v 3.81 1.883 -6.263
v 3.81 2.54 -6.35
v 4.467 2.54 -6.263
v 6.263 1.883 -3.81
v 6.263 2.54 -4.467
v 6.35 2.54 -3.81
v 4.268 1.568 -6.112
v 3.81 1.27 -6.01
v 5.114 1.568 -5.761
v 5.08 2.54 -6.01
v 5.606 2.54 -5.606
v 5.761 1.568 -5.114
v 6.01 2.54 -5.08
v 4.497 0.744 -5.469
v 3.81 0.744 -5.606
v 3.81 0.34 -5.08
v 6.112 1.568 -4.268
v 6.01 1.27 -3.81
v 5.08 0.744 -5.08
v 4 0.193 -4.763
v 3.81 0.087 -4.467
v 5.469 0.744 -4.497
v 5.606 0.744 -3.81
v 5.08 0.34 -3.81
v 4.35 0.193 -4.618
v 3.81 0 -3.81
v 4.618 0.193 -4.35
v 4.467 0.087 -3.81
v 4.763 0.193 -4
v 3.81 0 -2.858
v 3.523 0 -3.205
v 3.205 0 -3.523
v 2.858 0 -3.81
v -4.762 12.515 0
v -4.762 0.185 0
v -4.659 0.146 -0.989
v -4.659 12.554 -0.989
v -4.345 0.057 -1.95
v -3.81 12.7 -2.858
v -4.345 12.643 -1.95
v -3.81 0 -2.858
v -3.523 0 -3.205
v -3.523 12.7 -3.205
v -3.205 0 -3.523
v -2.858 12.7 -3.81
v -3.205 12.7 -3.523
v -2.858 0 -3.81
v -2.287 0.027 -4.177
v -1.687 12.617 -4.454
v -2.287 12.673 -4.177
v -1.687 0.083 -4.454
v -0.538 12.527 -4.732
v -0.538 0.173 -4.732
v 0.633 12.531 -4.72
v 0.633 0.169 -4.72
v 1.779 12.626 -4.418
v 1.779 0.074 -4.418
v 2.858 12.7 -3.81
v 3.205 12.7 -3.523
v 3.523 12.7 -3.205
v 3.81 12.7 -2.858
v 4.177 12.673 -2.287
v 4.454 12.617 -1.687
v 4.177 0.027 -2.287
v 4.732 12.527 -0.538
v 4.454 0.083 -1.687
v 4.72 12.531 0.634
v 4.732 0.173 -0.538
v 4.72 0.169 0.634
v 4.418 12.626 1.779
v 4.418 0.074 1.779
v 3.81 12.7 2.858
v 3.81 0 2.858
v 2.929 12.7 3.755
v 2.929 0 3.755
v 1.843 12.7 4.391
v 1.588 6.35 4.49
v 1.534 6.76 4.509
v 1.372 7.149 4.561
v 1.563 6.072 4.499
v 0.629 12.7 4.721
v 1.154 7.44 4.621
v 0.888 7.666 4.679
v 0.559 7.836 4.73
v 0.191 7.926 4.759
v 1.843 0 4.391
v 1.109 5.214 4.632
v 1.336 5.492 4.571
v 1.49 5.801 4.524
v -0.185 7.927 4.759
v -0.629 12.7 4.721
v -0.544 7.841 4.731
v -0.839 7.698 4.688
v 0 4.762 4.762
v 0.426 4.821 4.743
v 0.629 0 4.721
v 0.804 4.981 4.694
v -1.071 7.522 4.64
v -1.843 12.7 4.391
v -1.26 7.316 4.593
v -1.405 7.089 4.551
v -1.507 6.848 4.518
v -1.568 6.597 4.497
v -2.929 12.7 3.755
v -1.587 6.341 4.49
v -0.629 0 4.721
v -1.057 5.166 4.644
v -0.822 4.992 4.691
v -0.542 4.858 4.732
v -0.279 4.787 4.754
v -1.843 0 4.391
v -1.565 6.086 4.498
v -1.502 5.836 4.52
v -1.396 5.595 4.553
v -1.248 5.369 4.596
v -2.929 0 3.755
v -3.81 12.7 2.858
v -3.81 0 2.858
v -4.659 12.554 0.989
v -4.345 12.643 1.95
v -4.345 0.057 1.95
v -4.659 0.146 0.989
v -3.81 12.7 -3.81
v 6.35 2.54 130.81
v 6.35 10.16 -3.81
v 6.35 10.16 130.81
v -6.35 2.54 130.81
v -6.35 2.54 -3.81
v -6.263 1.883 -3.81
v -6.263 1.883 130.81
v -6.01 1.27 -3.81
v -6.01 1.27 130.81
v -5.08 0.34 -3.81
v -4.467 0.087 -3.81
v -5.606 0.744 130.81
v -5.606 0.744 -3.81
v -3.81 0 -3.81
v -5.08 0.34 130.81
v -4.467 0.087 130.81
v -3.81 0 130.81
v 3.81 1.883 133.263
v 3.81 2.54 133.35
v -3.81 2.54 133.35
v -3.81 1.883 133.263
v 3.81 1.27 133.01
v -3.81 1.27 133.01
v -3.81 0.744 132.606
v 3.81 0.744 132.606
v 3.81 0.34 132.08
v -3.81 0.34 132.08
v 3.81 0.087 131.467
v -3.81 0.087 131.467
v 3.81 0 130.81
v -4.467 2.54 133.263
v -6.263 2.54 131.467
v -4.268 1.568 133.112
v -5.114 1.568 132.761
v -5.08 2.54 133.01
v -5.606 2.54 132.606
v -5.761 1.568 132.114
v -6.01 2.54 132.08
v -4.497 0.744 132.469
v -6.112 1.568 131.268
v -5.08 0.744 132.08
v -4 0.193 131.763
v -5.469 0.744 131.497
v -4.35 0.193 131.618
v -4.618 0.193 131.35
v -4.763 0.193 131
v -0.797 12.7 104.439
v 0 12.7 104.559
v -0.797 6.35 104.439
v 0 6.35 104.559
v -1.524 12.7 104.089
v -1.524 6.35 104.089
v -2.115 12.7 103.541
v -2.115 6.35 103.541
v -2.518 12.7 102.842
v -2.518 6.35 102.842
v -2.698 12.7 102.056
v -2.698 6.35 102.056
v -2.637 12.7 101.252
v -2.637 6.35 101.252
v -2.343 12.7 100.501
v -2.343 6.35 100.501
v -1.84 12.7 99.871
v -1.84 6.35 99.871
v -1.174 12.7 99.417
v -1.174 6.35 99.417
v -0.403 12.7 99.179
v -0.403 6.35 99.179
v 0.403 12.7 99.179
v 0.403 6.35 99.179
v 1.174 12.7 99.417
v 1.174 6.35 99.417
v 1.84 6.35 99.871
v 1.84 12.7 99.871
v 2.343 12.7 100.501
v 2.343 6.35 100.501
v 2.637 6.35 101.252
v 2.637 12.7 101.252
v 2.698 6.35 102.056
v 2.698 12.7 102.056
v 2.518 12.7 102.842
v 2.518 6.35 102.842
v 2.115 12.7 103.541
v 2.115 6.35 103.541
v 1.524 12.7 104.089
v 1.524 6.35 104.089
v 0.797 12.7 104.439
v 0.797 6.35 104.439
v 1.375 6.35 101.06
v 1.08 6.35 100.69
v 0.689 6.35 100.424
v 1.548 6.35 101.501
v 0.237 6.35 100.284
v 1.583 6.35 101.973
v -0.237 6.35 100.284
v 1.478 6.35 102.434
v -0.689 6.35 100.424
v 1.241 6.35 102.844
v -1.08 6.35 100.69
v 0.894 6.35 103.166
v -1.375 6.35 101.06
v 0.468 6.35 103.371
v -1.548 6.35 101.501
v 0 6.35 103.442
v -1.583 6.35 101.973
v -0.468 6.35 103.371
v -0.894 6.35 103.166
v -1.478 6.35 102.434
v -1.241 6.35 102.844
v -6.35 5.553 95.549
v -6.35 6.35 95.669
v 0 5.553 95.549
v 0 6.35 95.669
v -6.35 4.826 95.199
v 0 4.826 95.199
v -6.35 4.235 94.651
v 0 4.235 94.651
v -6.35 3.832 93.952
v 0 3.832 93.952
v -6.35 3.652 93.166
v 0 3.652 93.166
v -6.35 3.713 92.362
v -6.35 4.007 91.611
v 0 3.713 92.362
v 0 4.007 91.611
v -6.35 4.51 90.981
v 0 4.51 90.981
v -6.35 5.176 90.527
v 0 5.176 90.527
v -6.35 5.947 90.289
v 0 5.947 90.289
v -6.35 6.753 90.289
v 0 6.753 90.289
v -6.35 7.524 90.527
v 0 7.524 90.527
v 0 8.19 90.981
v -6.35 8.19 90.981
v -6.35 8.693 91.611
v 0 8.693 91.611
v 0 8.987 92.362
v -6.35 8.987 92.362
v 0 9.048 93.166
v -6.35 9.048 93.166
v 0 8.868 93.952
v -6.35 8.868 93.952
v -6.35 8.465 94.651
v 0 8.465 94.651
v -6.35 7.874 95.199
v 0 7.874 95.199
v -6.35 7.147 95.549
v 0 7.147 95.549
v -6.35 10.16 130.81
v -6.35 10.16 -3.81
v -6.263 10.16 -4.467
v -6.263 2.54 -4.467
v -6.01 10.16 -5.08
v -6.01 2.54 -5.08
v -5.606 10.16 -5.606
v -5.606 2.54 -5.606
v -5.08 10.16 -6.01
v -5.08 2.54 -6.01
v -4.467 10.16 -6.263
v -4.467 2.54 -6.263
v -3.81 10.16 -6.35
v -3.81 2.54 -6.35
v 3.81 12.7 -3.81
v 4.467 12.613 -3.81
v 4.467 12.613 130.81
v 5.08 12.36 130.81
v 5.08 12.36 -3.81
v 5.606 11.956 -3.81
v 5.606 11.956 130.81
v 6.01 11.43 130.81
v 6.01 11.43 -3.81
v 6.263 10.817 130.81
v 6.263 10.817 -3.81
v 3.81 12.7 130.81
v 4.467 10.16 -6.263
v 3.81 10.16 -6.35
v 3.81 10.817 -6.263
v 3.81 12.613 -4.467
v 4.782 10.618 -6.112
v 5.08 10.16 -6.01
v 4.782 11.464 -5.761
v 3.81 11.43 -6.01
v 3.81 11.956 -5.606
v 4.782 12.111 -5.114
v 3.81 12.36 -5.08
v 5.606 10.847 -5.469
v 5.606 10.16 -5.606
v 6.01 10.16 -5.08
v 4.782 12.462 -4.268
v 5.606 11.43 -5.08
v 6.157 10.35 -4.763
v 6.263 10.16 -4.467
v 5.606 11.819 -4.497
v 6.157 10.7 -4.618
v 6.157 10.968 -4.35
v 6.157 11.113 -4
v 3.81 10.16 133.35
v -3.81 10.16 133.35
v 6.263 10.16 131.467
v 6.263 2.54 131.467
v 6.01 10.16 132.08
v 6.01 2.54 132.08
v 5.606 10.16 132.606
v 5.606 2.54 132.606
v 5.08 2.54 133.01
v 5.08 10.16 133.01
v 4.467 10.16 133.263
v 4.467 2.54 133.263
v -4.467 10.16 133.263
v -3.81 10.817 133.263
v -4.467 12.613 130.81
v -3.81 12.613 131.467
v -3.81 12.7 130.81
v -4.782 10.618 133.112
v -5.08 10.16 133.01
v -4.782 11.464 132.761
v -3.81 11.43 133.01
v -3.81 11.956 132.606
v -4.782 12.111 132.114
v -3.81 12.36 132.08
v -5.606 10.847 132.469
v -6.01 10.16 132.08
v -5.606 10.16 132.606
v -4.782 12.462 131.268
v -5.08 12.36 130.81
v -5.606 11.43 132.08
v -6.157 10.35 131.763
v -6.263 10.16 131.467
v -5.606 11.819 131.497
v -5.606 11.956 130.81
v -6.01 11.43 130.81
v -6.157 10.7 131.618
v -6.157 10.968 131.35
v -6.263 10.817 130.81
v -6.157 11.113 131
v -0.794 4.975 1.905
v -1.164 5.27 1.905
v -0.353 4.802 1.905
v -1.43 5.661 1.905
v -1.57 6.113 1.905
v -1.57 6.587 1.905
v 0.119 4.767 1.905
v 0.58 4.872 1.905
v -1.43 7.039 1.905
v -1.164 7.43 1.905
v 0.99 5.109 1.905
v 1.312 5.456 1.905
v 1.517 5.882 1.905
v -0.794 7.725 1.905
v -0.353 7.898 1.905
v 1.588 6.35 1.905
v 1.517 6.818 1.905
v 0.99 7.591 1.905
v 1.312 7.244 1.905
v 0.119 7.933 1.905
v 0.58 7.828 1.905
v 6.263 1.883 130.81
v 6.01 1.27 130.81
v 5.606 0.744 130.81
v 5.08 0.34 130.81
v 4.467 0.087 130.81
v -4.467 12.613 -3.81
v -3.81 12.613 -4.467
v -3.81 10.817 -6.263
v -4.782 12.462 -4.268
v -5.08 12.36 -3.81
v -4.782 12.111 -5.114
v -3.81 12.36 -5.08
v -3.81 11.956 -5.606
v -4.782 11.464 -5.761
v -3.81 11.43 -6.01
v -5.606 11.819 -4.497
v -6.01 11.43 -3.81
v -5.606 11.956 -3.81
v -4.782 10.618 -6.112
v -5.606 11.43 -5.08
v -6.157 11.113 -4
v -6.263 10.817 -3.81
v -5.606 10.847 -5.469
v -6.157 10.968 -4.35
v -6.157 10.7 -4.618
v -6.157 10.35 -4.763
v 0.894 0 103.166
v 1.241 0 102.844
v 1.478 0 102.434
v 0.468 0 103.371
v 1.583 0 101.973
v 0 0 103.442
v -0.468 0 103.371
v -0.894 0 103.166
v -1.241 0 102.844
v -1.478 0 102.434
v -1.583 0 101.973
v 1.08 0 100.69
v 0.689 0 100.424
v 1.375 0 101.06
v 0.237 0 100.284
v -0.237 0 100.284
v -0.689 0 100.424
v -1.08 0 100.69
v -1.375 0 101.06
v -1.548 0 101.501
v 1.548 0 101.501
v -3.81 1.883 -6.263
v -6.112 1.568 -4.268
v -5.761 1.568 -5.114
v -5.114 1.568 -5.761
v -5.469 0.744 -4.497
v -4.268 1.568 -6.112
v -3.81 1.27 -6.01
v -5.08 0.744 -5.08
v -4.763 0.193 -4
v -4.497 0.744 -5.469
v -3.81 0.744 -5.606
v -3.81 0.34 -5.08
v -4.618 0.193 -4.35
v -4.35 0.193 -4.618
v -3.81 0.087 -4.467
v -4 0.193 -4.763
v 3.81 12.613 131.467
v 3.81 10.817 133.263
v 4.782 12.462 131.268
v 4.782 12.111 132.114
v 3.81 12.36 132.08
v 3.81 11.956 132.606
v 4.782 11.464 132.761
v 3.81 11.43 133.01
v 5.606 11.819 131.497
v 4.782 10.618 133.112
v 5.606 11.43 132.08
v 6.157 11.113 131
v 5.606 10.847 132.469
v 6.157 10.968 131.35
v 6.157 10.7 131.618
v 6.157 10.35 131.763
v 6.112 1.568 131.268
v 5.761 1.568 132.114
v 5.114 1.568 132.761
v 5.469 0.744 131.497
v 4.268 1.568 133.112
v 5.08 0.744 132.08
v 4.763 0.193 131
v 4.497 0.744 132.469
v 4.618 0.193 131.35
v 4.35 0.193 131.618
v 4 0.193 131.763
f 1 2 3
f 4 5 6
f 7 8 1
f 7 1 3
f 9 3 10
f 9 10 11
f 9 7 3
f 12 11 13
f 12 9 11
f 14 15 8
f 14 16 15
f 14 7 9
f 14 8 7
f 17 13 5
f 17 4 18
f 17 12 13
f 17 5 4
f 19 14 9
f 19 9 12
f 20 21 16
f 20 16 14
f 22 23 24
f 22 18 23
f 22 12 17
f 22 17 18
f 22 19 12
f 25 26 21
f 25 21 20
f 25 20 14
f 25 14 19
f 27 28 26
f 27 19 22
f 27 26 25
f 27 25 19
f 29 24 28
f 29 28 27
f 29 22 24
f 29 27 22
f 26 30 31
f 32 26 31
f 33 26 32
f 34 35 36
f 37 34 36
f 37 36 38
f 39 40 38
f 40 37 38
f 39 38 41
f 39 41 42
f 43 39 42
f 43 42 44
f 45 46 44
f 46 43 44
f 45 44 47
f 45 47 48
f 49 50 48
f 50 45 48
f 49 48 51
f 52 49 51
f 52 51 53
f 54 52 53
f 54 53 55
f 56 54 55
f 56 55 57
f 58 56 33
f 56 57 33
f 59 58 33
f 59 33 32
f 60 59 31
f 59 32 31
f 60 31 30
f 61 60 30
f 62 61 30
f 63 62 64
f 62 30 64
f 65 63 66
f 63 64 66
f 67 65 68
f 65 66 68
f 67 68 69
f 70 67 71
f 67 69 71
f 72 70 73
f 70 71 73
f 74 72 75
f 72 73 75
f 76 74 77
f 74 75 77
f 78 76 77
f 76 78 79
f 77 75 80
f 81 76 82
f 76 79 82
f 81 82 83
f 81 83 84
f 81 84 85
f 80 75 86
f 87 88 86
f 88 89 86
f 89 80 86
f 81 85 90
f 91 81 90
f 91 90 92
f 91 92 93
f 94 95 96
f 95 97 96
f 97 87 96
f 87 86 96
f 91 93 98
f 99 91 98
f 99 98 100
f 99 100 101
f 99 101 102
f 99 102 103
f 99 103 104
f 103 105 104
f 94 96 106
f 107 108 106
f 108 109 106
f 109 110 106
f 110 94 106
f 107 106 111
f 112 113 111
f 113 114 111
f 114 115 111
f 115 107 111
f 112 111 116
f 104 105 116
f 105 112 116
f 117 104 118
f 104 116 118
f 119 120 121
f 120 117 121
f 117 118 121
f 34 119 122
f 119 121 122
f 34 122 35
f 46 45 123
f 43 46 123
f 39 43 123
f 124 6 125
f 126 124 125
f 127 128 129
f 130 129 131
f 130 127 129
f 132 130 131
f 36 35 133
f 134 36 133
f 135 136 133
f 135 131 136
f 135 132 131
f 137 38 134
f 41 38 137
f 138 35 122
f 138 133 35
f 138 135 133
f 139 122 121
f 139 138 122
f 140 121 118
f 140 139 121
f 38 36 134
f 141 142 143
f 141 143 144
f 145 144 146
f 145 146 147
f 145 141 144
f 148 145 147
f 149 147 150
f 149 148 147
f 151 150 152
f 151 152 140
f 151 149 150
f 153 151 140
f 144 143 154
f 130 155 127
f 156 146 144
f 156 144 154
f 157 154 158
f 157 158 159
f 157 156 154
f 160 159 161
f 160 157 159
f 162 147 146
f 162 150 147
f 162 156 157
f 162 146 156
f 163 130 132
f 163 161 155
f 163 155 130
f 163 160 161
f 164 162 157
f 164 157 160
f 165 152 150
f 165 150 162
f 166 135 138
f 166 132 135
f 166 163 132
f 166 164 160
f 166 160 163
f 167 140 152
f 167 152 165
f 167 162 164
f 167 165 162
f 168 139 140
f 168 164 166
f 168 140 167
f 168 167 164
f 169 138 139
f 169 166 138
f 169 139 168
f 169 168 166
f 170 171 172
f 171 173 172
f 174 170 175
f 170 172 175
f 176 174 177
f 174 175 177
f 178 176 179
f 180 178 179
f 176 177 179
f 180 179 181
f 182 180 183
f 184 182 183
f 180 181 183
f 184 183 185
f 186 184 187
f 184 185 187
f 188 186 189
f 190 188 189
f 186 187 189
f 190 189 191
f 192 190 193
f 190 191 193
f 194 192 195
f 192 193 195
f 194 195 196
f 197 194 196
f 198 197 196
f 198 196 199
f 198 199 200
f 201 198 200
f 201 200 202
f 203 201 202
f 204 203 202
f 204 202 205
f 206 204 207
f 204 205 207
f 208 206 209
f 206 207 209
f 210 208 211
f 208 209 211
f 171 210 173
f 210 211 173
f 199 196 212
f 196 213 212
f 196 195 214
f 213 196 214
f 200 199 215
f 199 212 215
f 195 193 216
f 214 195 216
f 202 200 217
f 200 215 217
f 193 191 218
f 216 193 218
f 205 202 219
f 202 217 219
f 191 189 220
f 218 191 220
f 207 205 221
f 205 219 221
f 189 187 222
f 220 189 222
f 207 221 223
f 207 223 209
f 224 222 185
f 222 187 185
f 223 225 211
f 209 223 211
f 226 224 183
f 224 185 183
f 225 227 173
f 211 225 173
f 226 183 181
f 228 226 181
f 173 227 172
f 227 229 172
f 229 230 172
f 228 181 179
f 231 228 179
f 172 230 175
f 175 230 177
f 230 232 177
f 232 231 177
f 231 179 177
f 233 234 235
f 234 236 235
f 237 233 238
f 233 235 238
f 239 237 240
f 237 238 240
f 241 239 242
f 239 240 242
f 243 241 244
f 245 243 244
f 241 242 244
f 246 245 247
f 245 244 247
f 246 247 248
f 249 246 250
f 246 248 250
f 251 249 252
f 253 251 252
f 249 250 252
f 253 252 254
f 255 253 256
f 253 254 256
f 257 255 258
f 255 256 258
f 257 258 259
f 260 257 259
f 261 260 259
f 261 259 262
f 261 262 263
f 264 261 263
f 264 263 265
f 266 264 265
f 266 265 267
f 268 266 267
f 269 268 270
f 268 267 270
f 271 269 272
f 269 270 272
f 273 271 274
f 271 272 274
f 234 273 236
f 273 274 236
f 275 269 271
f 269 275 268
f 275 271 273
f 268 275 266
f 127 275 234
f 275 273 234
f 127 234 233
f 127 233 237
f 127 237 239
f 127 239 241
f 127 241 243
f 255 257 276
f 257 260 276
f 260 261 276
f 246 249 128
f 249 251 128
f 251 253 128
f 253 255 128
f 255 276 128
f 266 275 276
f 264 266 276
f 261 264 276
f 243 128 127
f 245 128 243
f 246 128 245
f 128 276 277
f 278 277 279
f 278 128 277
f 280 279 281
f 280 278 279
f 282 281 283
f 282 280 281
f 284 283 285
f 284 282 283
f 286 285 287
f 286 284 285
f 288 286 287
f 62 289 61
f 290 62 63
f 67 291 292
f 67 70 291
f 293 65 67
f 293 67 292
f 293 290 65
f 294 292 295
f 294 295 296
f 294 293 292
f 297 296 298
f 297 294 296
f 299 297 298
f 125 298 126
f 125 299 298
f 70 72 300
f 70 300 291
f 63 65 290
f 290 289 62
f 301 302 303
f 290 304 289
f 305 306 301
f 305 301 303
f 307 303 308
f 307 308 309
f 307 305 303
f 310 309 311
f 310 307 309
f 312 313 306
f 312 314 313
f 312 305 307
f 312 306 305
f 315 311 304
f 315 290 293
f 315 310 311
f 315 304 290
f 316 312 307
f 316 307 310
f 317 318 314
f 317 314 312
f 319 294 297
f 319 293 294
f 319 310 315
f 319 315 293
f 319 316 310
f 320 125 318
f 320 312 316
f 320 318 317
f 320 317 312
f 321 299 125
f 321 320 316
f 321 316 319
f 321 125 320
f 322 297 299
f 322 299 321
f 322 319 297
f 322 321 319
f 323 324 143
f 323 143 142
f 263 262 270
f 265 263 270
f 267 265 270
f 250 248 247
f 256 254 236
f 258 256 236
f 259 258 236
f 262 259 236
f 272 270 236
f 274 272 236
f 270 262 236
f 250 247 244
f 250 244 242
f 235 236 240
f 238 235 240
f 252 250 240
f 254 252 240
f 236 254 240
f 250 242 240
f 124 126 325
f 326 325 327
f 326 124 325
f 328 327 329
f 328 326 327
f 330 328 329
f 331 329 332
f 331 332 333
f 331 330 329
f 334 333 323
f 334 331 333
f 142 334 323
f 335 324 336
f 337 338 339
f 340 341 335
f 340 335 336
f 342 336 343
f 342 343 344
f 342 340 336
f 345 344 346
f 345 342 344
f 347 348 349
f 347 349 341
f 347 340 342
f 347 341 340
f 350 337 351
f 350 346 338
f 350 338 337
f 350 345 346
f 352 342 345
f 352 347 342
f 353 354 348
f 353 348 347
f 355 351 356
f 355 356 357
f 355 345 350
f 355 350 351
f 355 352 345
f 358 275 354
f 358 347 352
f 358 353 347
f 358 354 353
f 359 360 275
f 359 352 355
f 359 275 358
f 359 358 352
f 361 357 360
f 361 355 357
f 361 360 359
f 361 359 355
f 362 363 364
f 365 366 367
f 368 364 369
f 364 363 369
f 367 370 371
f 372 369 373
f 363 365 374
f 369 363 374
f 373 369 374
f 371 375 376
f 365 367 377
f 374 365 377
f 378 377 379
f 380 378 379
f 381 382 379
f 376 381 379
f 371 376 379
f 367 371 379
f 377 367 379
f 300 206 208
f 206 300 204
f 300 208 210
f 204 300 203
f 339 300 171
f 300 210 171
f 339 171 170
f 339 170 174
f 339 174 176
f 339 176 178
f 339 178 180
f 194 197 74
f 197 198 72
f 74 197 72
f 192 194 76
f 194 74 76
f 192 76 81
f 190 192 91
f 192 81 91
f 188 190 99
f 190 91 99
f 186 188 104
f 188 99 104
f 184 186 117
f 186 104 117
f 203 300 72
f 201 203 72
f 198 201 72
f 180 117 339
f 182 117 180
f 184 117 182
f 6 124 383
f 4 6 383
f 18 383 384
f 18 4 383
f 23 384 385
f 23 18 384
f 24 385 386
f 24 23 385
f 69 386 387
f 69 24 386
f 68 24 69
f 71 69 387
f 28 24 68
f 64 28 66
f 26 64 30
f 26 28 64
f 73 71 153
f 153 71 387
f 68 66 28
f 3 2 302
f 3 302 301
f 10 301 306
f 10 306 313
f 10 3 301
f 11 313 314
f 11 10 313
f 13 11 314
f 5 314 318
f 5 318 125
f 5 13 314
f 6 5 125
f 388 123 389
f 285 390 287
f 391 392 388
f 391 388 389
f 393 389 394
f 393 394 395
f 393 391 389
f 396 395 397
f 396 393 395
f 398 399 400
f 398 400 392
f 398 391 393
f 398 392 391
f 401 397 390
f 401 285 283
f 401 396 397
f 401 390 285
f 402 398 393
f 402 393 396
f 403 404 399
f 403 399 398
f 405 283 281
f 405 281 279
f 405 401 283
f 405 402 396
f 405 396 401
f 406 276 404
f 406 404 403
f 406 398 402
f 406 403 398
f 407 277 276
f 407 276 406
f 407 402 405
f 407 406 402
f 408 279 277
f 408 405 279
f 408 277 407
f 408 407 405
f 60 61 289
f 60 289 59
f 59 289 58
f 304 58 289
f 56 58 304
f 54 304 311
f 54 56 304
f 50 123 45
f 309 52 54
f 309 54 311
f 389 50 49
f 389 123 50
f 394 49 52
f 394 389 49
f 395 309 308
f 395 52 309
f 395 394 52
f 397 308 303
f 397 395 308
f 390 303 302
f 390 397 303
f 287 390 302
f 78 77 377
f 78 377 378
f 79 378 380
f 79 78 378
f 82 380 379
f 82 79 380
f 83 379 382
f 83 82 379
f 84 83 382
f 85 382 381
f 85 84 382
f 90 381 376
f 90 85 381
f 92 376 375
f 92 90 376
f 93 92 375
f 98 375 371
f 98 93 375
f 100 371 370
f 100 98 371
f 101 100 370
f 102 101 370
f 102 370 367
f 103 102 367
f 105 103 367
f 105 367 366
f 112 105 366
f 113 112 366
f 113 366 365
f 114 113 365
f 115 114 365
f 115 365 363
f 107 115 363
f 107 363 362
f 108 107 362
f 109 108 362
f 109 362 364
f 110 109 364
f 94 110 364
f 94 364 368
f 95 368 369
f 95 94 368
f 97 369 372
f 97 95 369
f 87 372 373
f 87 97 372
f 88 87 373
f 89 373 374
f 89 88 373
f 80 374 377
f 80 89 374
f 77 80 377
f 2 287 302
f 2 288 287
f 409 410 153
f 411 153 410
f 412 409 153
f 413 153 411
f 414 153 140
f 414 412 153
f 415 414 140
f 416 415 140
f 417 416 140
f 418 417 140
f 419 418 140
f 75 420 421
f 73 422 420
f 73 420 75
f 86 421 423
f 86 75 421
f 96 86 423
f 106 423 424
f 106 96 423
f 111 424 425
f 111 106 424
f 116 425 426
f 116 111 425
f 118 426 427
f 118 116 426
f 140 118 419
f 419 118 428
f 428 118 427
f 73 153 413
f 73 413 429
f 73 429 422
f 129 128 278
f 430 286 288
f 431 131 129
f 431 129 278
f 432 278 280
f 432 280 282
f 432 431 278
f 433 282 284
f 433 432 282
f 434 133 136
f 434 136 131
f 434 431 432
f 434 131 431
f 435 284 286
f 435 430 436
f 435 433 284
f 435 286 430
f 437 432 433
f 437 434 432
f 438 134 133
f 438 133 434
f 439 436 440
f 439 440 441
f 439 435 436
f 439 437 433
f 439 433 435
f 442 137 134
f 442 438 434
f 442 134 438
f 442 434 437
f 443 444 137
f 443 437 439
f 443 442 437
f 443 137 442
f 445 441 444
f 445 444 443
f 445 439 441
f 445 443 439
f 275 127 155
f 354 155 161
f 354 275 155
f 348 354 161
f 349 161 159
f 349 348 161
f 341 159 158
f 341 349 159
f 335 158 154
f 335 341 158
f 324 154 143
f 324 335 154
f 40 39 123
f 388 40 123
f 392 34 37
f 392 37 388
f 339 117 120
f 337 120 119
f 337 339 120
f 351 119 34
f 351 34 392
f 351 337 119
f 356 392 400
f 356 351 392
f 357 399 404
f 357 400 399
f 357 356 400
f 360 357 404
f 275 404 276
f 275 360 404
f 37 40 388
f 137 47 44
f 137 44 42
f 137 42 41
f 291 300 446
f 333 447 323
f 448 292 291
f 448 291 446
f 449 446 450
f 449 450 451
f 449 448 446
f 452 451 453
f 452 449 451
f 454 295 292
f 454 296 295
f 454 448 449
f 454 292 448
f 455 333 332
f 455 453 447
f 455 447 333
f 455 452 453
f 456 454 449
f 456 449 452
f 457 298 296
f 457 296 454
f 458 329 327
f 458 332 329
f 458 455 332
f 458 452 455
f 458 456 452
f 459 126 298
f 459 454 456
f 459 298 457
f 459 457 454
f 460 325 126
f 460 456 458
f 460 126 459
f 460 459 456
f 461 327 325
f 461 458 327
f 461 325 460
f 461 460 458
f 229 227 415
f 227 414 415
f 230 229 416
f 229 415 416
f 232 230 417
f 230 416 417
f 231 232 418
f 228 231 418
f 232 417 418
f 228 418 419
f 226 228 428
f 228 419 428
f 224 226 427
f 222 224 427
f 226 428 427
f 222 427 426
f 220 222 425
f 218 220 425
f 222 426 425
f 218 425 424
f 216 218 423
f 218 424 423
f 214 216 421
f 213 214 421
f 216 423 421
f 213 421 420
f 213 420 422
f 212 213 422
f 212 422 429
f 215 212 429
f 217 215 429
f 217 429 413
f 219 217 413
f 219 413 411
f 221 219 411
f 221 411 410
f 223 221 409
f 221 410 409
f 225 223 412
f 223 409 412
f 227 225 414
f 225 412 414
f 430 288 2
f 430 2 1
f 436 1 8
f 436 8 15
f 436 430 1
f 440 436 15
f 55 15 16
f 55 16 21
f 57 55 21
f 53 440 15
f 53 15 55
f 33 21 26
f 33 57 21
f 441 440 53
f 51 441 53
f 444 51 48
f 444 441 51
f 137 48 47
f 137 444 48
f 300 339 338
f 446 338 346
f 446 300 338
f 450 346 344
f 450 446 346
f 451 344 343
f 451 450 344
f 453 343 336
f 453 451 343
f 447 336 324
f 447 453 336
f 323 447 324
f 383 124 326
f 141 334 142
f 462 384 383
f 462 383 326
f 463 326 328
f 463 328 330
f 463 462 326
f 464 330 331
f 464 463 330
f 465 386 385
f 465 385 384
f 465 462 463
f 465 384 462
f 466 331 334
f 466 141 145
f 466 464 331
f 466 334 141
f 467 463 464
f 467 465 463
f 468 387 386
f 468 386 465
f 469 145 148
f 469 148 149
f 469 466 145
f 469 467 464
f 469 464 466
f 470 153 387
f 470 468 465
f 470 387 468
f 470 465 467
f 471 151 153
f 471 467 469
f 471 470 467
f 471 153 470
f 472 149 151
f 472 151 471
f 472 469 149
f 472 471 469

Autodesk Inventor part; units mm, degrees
ref_plane "YZ Plane" through (0, 0, 0) normal (1, 0, 0) x (0, 1, 0)
ref_plane "XZ Plane" through (0, 0, 0) normal (0, 1, 0) x (-1, 0, 0)
ref_plane "XY Plane" through (0, 0, 0) normal (0, 0, 1) x (1, 0, 0)
sketch "Sketch1" plane through (0, 0, 0) normal (0, 1, 0) x (-1, 0, 0)
  line L0 (-6.35, 6.35) -> (6.35, 6.35)
  line L1 (6.35, 6.35) -> (6.35, -6.35)
  line L2 (6.35, -6.35) -> (-6.35, -6.35)
  line L3 (-6.35, -6.35) -> (-6.35, 6.35)
  line L4 (-6.35, 6.35) -> (6.35, -6.35) construction
  line L5 (6.35, 6.35) -> (-6.35, -6.35) construction
  circle A0 centre (0, 0) radius 4.7625
  dimension "d0" = 12.7
  dimension "d1" = 12.7
  dimension "d2" = 9.525
extrude "Extrusion1" add sketch "Sketch1" along normal blind 12.7
sketch "Sketch2" plane through (-6.35, 0, 6.35) normal (0, 0, 1) x (1, 0, 0)
  line L0 (6.35, 0) -> (6.35, 6.35)
  circle A0 centre (6.35, 6.35) radius 1.5875
  dimension "d5" = 6.35
  dimension "d6" = 3.175
extrude "Extrusion2" add sketch "Sketch2" against normal blind 4.445
sketch "Sketch3" plane through (-6.35, 0, 6.35) normal (0, 0, 1) x (1, 0, 0)
  line L0 (12.7, 0) -> (0, 0) projected
  line L1 (12.7, 0) -> (12.7, 12.7) projected
  line L2 (0, 0) -> (12.7, 0)
  line L3 (12.7, 0) -> (12.7, 12.7)
  line L4 (12.7, 12.7) -> (0, 12.7)
  line L5 (0, 12.7) -> (0, 0)
  point P0 (6.35, 0)
extrude "Extrusion3" add sketch "Sketch3" along normal blind 127
fillet "Fillet1" radius 2.54 12 edges at (6.35, 12.7, 63.5) (6.35, 0, 63.5) (-6.35, 12.7, 63.5) (-6.35, 0, 63.5) (-6.35, 6.35, 133.35) (0, 0, 133.35) (6.35, 6.35, 133.35) (0, 12.7, 133.35) (-6.35, 6.35, -6.35) (6.35, 6.35, -6.35) (0, 12.7, -6.35) (0, 0, -6.35)
sketch "Sketch4" plane through (0, 12.7, 0) normal (0, 1, 0) x (1, 0, 0)
  line L0 (0, 0) -> (0, -101.854)
  line L1 (0, 0) -> (101.854, 0) construction
  dimension "d12" = 101.854
  dimension "d13" = 90
hole "Hole1" at (0, 12.7, 101.854) direction (0, -1, 0) diameter 5.4102 depth 6.35
hole "Hole2" at (0, 12.7, 101.854) direction (0, -1, 0) diameter 3.175 depth 25.4 tip angle 118
sketch "Sketch5" plane through (-6.35, 2.54, -3.81) normal (-1, 0, 0) x (0, 0, 1)
  line L0 (3.81, -2.54) -> (96.774, -2.54)
  line L1 (3.81, -2.54) -> (96.774, -2.54) construction
  line L2 (96.774, -2.54) -> (96.774, 3.81)
  line L3 (134.62, 0) -> (0, 0) projected
  line L4 (96.774, -2.54) -> (103.124, -2.54) construction
  point P0 (3.81, 10.16)
  dimension "d28" = 92.964
  dimension "d29" = 0
  dimension "d30" = 6.35
  dimension "d31" = 90
hole "Hole3" at (-6.35, 6.35, 92.964) direction (1, 0, 0) diameter 5.4102 depth 6.35
properties part number "spincoater dispense arm"
